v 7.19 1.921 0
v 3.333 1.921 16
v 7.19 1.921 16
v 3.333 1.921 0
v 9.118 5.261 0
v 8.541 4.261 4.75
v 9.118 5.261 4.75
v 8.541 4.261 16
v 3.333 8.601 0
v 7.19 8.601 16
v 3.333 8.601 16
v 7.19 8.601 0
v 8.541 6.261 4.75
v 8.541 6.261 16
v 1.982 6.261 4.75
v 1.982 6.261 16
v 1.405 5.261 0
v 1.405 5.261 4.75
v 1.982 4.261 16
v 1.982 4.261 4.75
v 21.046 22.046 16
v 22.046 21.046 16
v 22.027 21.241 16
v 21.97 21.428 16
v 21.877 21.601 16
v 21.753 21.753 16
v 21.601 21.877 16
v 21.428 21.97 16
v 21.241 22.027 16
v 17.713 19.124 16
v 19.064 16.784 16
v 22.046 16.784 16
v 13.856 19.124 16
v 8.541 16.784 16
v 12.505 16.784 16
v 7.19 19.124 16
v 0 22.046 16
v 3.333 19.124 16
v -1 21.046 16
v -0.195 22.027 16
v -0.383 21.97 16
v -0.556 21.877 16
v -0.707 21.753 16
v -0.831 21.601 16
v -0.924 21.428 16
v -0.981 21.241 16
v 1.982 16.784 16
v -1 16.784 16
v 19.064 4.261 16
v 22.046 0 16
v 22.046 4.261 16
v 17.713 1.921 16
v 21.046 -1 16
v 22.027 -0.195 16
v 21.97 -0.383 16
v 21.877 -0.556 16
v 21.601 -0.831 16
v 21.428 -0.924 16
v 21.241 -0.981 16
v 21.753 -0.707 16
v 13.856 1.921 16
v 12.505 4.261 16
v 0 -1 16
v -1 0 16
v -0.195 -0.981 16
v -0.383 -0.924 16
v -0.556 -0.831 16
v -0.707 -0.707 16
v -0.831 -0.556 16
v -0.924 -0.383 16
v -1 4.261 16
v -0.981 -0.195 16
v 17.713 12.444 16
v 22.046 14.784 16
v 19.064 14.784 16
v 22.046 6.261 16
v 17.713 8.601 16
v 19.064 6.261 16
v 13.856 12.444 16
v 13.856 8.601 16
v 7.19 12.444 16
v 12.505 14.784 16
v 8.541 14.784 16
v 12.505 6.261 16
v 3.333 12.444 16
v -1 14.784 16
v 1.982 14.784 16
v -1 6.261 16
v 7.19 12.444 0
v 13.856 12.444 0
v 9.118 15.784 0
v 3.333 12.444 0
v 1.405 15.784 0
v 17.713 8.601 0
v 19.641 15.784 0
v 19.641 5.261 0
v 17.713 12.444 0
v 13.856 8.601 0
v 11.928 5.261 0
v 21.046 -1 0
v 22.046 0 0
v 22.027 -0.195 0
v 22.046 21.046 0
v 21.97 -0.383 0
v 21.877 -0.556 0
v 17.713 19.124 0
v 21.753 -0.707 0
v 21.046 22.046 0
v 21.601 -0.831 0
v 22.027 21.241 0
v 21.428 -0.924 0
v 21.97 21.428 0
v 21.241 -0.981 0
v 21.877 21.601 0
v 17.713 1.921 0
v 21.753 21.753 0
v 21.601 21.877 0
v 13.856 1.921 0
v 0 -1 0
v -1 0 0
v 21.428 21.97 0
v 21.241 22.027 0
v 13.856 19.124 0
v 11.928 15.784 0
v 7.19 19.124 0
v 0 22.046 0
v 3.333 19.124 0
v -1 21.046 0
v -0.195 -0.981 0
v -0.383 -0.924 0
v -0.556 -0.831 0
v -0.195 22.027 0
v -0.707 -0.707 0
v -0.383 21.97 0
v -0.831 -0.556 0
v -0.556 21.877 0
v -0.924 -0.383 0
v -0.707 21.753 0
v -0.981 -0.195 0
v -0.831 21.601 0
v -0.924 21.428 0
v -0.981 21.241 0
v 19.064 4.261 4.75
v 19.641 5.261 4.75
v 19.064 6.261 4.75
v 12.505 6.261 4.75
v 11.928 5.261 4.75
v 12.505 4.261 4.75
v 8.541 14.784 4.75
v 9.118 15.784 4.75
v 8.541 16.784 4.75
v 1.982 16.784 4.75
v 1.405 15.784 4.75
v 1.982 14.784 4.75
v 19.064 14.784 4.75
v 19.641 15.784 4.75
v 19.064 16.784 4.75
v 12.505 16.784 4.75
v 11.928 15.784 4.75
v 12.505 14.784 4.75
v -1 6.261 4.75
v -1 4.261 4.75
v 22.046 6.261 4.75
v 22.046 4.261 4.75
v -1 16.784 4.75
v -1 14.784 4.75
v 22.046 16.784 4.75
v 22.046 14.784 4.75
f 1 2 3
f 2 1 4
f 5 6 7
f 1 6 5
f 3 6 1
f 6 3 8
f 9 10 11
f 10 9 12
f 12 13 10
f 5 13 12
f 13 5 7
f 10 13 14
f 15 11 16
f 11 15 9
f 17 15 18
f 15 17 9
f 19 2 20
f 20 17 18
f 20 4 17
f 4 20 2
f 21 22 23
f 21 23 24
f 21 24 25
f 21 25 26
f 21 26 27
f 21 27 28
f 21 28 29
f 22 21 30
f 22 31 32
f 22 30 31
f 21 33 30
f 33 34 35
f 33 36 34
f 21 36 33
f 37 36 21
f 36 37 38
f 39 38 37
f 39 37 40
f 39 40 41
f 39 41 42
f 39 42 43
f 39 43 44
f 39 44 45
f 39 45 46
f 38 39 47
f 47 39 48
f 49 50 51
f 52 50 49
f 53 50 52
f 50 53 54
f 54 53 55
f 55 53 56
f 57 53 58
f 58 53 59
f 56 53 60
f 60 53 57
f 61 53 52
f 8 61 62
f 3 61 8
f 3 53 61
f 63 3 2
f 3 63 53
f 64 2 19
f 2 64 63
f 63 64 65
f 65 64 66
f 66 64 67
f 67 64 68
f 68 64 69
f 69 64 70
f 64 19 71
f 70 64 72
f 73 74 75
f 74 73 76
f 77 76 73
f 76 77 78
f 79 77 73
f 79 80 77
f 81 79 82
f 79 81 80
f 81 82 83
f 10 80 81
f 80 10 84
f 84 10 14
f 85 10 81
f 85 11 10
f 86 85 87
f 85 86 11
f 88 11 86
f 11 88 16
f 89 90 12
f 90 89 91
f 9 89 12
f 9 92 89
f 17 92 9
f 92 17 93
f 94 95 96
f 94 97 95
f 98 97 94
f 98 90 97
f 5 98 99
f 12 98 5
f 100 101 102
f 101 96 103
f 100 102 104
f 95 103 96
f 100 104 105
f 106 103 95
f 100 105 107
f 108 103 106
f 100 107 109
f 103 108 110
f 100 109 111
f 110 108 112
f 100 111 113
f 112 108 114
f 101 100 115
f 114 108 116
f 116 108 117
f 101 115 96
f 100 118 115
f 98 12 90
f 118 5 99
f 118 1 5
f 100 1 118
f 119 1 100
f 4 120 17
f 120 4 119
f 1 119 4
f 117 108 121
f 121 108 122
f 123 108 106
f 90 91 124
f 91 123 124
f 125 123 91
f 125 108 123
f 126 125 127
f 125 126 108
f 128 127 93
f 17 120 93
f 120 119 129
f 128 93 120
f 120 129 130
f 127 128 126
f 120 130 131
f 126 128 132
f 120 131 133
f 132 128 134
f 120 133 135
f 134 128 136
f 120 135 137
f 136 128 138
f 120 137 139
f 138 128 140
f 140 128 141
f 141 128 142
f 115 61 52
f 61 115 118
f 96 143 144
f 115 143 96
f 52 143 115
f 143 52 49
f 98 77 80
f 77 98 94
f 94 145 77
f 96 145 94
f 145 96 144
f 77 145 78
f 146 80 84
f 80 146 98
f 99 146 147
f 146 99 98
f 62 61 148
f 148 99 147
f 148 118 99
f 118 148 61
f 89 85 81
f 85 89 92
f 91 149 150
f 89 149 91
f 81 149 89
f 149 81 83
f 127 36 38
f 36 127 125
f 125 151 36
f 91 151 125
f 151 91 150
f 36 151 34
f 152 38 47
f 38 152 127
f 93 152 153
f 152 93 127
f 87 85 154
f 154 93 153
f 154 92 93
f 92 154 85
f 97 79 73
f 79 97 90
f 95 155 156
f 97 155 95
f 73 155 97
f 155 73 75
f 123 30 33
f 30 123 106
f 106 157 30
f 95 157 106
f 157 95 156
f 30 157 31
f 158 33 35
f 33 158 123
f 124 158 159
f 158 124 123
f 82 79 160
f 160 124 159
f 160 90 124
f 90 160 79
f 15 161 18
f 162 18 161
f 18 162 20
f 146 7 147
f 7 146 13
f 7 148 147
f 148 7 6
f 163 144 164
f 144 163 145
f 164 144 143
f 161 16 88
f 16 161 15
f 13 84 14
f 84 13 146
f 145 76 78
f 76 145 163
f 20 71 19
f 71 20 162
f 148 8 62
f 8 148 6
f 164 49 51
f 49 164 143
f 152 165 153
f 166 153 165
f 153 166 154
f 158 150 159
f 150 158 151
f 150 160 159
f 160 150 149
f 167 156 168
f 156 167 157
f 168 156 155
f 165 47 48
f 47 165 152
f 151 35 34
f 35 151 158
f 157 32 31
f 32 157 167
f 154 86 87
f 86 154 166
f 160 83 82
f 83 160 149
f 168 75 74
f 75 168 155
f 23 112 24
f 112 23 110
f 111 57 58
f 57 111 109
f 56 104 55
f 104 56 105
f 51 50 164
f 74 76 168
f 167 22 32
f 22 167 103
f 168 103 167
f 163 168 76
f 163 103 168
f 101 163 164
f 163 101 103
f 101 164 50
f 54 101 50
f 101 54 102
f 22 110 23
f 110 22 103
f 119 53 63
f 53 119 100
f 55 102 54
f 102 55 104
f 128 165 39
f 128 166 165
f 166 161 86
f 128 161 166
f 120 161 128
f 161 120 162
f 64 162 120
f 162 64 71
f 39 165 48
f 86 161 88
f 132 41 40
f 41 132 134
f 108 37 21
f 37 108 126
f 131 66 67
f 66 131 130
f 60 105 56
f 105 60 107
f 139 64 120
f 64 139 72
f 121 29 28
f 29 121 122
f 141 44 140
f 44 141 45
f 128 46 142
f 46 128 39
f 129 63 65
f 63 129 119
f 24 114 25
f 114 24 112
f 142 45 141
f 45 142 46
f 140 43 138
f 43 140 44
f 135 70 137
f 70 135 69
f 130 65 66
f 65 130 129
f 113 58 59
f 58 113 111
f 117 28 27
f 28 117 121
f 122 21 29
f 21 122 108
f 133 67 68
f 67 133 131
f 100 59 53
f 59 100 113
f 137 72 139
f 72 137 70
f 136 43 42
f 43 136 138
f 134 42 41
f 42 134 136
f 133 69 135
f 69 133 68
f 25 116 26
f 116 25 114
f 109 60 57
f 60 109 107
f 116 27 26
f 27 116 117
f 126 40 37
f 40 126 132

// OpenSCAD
/**
	Customisable hex bit holder 
	Copyring Mykhaylo Lytvynyuk March 2015
	http://mobilemodding.info
	Released under 
	Attribution - Non-Commercial - No Derivatives License

	*** March 16, 2015 Initial Version
*/

// number of rows
_row = 2;//[0,1,2,3,4,5,6,7,8,9,10,11,12,13,14,15] 					

// number of columns
_colum = 2;//[0,1,2,3,4,5,6,7,8,9,10,11,12,13,14,15]
 					
// mm, base height
_height = 15;

// mm, printer tolerance, can be negative, required to compensate specific printer contraction/expansion during print.
_tolerance = 0.33;

//mm, between sides and bit
_extraPadding = 3;

// Rounded corners
_rounded = 1;//[1:Yes,0:No]

// Determines if hole goes compeltely through the base
_holeThrough = 1;	//[1:Yes,0:No]	

// Make slot to add flex to the walls
_slotted = 1;//[1:Yes,0:No]

// mm, defines bit zise ( 6.35 is 1/4" )
_bitSize = 6.35;

/* [Hidden] */
// local vars
outerRadius = outRadius(_bitSize + _tolerance/2,6);
delta = outerRadius + _extraPadding;
width = ( _colum * (outerRadius + _extraPadding) );
depth = ( _row * (outerRadius + _extraPadding) );
minkowskiCylinderHeight = 1;

module assembly() {

difference() {
	base();
	for(yd = [1:_row]) {
		for(xd = [1:_colum]) {
				translate([(xd * delta)-(delta/2),(yd *delta)-(delta/2),_holeThrough?0:1]) hexBit();
		}
		if(_slotted){
			translate([-2,(yd *delta)-(delta/2) - 1,minkowskiCylinderHeight + _height - _height * 0.75]) cube([width + 4,2,_height*0.75],center=false);
		}
	}
}

}

module hexBit() {
	cylinder(h=_height+minkowskiCylinderHeight,r=outRadius(_bitSize/2 + _tolerance/2,6),$fn=6, center = false);
}

module base() {
	minkowski() {
		cube([width,depth,_height]);
		if(_rounded) cylinder(r=1,h=minkowskiCylinderHeight,$fn=32,center = false);
	}
}

// calculates outradious by given inradius
function outRadius(inradius, sides) = inradius / ( cos (180 / sides));

assembly();
